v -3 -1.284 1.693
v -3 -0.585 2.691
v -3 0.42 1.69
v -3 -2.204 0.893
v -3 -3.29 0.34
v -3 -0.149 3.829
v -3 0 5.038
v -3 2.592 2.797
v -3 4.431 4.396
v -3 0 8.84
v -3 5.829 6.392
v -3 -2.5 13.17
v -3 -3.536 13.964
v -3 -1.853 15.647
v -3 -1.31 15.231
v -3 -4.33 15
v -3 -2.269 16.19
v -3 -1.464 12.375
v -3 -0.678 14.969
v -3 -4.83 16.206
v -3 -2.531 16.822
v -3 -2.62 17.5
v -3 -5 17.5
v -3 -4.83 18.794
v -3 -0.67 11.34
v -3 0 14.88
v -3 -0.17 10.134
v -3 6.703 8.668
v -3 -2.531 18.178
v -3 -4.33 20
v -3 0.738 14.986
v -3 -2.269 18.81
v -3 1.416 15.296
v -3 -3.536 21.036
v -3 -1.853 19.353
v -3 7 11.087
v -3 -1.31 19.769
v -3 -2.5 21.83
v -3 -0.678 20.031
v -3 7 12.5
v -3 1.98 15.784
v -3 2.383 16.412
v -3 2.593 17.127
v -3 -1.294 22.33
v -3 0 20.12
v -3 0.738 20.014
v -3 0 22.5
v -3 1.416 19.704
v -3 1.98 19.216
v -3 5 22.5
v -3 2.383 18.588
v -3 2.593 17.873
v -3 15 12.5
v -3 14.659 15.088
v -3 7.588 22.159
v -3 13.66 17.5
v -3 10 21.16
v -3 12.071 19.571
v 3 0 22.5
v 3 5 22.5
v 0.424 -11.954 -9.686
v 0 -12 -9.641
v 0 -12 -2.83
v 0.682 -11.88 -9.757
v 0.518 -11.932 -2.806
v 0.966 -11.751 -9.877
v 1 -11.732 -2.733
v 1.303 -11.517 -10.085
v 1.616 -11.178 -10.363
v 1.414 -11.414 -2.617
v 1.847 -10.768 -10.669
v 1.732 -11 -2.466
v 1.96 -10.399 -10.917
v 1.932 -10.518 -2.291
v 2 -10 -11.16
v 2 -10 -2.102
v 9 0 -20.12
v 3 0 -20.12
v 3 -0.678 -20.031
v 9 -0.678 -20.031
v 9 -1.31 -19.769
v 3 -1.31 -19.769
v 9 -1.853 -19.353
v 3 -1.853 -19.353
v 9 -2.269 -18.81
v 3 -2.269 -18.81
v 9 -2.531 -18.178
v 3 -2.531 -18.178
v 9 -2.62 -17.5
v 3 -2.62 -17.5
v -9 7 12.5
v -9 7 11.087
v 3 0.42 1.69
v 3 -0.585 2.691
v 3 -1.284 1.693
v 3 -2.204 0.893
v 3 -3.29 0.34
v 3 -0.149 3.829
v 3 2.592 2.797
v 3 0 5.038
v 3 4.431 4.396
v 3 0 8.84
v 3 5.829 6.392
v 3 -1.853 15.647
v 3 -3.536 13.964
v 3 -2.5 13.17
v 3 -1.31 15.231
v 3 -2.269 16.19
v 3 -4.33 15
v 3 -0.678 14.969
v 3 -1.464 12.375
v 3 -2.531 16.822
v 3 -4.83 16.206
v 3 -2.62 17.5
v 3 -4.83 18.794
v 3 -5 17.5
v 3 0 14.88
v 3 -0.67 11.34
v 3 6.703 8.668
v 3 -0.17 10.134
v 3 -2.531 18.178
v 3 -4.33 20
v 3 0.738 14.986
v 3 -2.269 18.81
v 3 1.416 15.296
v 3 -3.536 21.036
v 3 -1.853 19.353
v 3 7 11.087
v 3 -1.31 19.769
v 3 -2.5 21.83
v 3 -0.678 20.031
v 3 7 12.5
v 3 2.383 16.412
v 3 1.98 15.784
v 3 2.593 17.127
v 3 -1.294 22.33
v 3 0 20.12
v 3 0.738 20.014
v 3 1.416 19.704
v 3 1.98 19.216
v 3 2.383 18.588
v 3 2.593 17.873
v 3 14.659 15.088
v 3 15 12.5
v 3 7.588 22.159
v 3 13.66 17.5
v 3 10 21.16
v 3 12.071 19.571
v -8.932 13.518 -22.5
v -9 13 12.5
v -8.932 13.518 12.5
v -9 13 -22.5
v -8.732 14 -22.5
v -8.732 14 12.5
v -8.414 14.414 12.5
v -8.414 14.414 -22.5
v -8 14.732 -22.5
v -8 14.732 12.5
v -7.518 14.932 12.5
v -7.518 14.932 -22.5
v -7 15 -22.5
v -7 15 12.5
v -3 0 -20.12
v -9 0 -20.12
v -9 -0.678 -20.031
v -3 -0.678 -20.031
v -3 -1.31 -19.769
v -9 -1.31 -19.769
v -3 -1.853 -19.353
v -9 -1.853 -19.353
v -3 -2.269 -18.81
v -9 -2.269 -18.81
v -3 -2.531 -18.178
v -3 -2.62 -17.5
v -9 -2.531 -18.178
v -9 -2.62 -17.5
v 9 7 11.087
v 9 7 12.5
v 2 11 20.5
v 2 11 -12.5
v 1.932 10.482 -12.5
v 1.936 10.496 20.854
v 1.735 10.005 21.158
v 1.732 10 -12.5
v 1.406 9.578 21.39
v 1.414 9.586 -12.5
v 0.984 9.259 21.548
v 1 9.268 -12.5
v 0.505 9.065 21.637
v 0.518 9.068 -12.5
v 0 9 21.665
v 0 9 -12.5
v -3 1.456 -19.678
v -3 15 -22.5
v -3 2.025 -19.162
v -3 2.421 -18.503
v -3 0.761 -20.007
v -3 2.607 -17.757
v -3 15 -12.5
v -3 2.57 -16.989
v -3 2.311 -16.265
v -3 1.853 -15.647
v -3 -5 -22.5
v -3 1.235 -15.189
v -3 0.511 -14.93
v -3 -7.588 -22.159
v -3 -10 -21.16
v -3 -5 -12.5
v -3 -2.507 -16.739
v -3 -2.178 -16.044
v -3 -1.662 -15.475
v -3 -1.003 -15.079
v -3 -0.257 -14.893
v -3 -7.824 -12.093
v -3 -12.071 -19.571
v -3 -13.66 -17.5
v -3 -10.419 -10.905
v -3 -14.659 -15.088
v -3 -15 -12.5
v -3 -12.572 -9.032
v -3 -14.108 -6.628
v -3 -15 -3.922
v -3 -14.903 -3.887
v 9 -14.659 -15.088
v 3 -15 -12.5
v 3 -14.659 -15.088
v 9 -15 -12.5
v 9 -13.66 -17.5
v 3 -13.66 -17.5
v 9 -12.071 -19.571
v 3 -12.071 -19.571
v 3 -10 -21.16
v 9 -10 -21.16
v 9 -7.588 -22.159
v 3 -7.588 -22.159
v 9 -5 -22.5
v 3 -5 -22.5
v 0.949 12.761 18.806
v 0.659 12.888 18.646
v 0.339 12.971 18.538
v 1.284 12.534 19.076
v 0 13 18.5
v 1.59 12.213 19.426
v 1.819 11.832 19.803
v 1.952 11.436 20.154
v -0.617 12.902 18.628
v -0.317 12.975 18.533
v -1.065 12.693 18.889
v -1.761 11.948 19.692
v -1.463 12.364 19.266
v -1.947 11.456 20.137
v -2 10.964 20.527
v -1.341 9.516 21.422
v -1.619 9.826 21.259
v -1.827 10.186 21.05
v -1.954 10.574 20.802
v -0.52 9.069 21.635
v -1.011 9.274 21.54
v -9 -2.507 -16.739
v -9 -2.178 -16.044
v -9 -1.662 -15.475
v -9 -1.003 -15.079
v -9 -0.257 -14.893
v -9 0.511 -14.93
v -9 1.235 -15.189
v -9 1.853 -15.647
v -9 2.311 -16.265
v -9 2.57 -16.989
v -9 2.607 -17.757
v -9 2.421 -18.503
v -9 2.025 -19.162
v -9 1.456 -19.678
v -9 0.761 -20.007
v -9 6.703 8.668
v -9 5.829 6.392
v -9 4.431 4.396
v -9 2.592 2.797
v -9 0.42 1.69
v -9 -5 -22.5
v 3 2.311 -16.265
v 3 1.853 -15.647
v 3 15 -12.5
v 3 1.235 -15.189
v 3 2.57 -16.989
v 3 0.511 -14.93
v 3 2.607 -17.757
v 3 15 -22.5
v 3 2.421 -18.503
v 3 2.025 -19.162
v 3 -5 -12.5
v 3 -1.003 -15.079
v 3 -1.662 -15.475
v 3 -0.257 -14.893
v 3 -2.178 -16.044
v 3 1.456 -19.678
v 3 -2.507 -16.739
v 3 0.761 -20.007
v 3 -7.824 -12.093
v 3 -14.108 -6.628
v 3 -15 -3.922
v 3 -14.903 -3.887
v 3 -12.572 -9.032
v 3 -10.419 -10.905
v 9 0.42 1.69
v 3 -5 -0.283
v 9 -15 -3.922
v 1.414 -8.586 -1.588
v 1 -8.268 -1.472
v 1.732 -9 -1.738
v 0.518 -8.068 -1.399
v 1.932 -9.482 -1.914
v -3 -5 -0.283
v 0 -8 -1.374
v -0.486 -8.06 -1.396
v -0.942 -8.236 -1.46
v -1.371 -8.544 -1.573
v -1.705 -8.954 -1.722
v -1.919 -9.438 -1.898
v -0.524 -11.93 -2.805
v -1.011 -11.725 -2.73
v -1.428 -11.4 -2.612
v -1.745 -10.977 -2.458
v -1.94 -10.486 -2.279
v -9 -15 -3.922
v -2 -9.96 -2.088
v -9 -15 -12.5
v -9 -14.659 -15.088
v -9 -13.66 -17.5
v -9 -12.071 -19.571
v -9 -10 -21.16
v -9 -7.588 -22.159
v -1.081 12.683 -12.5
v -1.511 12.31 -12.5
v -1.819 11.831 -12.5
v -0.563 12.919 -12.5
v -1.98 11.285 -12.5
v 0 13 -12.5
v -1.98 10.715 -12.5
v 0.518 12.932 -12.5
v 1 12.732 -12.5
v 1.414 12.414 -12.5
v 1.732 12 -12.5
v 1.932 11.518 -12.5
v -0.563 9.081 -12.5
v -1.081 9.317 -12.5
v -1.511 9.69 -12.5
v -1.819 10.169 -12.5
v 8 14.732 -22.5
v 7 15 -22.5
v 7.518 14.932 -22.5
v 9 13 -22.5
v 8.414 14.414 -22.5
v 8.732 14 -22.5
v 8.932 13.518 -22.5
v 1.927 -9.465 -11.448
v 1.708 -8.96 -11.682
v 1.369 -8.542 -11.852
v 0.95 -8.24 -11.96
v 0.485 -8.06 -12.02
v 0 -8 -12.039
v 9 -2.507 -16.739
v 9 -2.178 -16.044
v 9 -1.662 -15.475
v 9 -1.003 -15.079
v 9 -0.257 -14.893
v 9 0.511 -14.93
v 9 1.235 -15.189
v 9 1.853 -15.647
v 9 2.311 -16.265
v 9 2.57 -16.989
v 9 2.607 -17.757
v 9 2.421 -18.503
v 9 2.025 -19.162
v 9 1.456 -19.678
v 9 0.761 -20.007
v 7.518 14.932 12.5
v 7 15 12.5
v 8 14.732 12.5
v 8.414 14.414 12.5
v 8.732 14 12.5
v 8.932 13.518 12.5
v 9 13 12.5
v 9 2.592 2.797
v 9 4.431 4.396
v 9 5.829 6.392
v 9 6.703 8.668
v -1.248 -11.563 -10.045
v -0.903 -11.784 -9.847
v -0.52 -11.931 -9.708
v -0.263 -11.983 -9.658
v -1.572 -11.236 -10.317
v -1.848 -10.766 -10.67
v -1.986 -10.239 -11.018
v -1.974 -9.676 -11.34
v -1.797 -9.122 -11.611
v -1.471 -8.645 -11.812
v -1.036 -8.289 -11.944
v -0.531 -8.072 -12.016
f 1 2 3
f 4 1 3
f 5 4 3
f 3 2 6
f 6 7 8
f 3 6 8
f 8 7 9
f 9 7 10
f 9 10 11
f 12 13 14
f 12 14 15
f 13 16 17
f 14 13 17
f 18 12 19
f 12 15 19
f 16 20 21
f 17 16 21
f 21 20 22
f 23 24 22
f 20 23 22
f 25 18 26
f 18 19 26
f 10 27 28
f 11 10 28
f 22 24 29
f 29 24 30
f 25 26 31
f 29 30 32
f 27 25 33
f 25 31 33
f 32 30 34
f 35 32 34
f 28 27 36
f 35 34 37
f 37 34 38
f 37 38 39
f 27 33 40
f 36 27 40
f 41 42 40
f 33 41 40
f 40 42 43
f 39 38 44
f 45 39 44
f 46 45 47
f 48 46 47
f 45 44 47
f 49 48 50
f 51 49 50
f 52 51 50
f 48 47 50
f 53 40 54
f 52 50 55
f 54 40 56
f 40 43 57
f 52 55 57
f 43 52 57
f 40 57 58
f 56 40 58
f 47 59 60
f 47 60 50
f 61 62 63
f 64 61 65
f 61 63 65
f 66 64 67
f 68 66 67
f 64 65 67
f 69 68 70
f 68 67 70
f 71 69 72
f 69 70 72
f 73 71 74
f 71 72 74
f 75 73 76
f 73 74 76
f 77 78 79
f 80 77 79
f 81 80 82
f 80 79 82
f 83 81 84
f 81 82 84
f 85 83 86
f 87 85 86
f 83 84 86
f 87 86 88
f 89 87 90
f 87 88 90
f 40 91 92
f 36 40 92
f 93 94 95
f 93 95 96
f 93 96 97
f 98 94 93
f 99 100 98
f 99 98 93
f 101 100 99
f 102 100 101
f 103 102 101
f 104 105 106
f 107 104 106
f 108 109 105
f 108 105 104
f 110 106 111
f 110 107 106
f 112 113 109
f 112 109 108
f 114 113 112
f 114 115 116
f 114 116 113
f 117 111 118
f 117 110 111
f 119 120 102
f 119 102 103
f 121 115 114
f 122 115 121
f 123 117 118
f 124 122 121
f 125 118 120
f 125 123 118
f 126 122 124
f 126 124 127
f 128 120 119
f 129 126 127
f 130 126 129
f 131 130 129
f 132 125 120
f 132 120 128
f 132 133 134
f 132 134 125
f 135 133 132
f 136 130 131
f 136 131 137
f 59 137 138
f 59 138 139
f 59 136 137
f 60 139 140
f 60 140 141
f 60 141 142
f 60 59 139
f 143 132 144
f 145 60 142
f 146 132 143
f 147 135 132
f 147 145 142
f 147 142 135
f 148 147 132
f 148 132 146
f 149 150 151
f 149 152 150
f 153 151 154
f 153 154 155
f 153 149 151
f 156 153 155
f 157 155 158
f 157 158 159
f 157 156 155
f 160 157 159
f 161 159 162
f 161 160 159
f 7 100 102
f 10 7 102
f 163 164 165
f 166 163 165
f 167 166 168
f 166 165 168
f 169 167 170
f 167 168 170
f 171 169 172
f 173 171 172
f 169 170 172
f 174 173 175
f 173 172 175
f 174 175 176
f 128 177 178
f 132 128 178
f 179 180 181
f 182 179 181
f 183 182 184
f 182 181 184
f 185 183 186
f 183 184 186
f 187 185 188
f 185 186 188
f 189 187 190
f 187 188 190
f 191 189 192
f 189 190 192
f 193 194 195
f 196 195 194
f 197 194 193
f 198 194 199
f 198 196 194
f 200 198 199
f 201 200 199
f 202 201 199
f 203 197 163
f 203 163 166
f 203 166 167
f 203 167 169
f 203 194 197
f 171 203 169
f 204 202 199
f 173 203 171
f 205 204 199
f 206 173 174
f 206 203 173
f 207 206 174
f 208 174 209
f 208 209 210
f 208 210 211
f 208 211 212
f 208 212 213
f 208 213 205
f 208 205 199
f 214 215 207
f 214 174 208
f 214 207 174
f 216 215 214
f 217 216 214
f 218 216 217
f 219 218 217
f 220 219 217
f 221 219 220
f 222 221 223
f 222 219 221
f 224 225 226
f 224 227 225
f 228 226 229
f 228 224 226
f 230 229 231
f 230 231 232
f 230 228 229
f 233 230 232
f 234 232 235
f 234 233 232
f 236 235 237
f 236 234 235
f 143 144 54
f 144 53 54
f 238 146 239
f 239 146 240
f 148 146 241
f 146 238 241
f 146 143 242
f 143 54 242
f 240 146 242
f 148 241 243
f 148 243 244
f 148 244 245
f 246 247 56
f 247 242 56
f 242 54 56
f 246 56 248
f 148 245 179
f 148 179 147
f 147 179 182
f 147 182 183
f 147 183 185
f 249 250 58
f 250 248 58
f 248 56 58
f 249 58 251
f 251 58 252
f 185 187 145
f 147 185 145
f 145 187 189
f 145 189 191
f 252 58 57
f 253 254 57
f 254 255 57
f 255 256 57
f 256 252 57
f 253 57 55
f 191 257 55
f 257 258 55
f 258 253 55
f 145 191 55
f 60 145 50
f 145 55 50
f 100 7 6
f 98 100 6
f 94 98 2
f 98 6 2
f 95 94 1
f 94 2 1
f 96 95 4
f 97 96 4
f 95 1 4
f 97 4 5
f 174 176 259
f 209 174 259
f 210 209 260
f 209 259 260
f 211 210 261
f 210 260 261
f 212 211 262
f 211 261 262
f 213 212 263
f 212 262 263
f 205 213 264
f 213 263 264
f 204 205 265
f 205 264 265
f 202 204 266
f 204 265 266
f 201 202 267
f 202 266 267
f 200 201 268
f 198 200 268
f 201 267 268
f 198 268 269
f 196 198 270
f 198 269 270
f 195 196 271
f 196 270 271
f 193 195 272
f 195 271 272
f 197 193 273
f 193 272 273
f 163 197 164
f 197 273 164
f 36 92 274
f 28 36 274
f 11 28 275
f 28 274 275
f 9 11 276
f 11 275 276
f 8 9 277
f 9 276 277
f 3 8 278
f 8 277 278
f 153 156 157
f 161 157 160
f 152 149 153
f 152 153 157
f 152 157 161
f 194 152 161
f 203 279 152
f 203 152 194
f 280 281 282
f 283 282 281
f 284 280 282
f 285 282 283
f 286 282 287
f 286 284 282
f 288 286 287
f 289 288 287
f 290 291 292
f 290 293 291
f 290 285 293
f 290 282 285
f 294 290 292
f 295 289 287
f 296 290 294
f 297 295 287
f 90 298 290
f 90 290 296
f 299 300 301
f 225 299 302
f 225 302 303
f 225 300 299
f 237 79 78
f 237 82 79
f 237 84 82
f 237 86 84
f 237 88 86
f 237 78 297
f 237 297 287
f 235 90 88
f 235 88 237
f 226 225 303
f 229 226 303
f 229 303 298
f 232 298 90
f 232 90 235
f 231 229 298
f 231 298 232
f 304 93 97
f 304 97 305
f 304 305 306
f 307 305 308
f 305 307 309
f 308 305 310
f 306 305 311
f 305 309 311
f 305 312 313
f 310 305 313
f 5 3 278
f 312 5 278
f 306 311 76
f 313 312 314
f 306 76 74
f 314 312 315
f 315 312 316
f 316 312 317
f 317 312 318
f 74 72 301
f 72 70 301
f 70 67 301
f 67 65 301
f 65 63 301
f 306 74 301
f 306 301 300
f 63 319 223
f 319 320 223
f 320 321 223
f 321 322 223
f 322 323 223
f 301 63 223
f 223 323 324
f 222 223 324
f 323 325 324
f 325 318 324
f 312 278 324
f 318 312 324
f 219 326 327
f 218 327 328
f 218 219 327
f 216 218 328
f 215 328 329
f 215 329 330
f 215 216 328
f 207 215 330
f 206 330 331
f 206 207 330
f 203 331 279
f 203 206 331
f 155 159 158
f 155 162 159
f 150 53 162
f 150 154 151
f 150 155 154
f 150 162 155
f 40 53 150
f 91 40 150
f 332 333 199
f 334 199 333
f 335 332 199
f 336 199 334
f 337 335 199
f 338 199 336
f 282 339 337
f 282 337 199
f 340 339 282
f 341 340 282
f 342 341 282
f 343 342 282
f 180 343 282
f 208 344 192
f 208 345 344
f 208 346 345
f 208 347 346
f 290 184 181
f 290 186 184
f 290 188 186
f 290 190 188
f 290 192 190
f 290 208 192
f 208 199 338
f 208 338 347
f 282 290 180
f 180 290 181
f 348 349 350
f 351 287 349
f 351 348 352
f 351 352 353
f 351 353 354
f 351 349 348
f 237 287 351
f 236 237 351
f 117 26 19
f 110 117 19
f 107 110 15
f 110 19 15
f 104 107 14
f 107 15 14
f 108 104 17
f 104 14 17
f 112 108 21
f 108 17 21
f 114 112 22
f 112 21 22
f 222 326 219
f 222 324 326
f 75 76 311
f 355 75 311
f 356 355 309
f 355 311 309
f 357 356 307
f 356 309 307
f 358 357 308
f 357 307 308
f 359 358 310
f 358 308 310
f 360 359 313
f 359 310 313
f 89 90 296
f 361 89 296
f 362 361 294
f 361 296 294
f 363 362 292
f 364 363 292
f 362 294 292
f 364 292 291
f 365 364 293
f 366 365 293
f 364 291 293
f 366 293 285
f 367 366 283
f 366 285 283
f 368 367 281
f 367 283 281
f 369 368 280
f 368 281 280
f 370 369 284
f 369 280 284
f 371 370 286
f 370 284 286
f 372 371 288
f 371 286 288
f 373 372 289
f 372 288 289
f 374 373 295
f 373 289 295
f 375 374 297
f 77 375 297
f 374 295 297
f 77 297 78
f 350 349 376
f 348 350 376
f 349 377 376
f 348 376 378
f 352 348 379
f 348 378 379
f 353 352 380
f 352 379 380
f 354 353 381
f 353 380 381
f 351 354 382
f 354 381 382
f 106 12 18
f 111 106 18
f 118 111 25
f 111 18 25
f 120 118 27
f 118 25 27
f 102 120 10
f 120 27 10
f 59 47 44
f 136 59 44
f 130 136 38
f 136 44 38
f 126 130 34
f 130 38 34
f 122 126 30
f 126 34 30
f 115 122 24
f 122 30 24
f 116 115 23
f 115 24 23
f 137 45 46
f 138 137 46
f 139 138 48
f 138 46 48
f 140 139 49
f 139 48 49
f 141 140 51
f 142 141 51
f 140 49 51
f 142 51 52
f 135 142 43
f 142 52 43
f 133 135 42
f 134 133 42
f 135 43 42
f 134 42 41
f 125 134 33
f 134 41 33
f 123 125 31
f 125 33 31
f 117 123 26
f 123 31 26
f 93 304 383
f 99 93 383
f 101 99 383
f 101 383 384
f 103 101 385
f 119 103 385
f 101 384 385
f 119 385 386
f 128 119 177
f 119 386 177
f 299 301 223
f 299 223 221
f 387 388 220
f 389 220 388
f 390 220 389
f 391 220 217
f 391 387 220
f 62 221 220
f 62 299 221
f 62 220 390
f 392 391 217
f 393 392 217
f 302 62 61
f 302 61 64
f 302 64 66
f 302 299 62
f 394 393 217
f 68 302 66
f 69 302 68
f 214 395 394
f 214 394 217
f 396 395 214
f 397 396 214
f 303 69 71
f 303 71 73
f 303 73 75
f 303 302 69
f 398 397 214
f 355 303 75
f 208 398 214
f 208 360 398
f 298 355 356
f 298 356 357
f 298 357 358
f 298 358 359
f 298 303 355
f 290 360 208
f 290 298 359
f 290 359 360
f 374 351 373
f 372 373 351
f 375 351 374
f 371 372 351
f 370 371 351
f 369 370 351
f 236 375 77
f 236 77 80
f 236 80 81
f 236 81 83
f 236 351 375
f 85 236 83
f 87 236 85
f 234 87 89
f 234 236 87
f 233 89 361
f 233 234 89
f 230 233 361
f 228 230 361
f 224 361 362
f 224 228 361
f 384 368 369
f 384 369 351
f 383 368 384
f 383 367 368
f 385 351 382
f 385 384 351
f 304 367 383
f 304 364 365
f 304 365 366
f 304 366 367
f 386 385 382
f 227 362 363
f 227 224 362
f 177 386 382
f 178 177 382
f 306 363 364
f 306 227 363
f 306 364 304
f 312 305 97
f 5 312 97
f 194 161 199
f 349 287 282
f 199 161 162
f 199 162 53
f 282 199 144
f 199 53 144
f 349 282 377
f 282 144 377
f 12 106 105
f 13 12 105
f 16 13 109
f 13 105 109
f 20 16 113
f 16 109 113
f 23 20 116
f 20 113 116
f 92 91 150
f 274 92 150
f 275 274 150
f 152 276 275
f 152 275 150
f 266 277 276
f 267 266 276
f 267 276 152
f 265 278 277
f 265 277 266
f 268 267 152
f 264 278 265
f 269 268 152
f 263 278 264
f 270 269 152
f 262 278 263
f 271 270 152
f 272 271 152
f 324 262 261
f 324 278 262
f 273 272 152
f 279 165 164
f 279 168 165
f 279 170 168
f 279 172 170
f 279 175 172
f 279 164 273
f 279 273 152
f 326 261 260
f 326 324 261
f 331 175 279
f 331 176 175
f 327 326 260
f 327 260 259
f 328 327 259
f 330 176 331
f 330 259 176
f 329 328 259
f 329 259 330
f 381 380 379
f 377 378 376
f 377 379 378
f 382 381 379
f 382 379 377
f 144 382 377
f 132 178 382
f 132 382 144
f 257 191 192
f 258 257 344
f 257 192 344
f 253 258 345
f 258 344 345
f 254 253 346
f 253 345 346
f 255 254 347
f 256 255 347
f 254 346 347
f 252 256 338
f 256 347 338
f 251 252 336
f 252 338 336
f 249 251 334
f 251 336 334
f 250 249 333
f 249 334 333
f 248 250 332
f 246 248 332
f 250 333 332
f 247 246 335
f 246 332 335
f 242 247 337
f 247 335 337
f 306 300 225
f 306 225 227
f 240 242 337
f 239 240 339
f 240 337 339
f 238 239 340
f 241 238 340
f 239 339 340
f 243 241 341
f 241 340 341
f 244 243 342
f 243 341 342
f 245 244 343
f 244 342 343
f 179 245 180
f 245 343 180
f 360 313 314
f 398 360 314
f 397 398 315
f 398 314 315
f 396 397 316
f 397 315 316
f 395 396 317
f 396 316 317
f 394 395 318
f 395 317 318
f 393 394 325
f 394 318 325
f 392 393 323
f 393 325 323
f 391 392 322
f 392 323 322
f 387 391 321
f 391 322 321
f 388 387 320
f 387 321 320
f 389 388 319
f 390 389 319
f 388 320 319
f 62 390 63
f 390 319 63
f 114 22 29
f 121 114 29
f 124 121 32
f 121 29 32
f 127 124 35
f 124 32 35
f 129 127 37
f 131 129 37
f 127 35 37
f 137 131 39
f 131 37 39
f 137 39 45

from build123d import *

# Parameters (mm, degrees)
F1_DEPTH     = 15
F3_DEPTH     = 6
F5_DEPTH     = 18
F6_R         = 10
F7_R         = 10
F10_DEPTH    = 6
F11_DEPTH    = 6
F12_R        = 2
F14_DEPTH    = 6
F18_DEPTH    = 40
F20_DEPTH    = 40
F22_DEPTH    = 6
F23_T1_DEPTH = 6


# Not quite as in the source:
# - a fillet or chamfer that OpenCascade refuses, or shapes differently, is made with other operations: its cross-section is extruded or revolved along the edge and cut away or added


with BuildPart() as f1:
    # F0 (on Front) → F1 (new body, symmetric)
    with BuildSketch(Plane.XZ):
        Polygon((9, -12.5), (9, 12.5), (3, 12.5), (3, 22.5), (-3, 22.5), (-3, 12.5), (-9, 12.5), (-9, -12.5), (-9, -22.5), (-3, -22.5), (-3, -12.5), (3, -12.5), (3, -22.5), (9, -22.5), align=None)
    extrude(amount=F1_DEPTH, both=True)

    # F2 (on face) → F3 (cut)
    with BuildSketch(Plane(origin=(-3, 0, 0), x_dir=(0, -1, 0), z_dir=(-1, 0, 0))):
        with BuildLine():
            ThreePointArc((0, 20.12), (-2.62, 17.5), (0, 14.88))
            Line((0, 14.88), (0, 20.12))
        make_face()
        with BuildLine():
            Line((0, 20.12), (0, 14.88))
            ThreePointArc((0, 14.88), (1.8526197667, 15.6473802333), (2.62, 17.5))
            ThreePointArc((2.62, 17.5), (1.8526197667, 19.3526197667), (0, 20.12))
        make_face()
    extrude(amount=-F3_DEPTH, mode=Mode.SUBTRACT)

    # F4 (on face) → F5 (cut)
    with BuildSketch(Plane(origin=(-9, 0, 0), x_dir=(0, -1, 0), z_dir=(-1, 0, 0))):
        with BuildLine():
            ThreePointArc((0, -20.12), (1.8526197667, -19.3526197667), (2.62, -17.5))
            ThreePointArc((2.62, -17.5), (-1.8526197667, -15.6473802333), (0, -20.12))
        make_face()
    extrude(amount=-F5_DEPTH, mode=Mode.SUBTRACT)

    # F6
    f6_edges = [f1.edges().sort_by_distance(p)[0] for p in [
        (0, -15, -12.5),
    ]]
    fillet(f6_edges, radius=F6_R)

    # F7
    f7_edges = [f1.edges().sort_by_distance(p)[0] for p in [
        (0, 15, 22.5),
        (0, -15, 22.5),
        (6, -15, -22.5),
        (-6, -15, -22.5),
    ]]
    fillet(f7_edges, radius=F7_R)

    # F9 (on face) → F10 (cut)
    with BuildSketch(Plane(origin=(-9, 0, 0), x_dir=(0, -1, 0), z_dir=(-1, 0, 0))):
        with BuildLine():
            ThreePointArc((-7, 11.0872004348), (-5.1915204429, 5.3514360713), (-0.4202014333, 1.690274227))
            Line((-0.4202014333, 1.690274227), (15, -3.9222201011))
            Line((15, -3.9222201011), (15, 12.5))
            Line((15, 12.5), (-7, 12.5))
            Line((-7, 12.5), (-7, 11.0872004348))
        make_face()
    extrude(amount=-F10_DEPTH, mode=Mode.SUBTRACT)

    # F8 (on face) → F11 (cut)
    with BuildSketch(Plane.YZ.offset(9)):
        with BuildLine():
            Line((7, 12.5), (-15, 12.5))
            Line((-15, 12.5), (-15, -3.92222))
            Line((-15, -3.92222), (0.4202014333, 1.6902743281))
            ThreePointArc((0.4202014333, 1.6902743281), (5.1915204429, 5.3514361724), (7, 11.087200536))
            Line((7, 11.087200536), (7, 12.5))
        make_face()
    extrude(amount=-F11_DEPTH, mode=Mode.SUBTRACT)

    # F12
    f12_edges = [f1.edges().sort_by_distance(p)[0] for p in [
        (9, 15, -5),
        (-9, 15, -5),
    ]]
    fillet(f12_edges, radius=F12_R)

    # F13 (on face) → F14 (cut)
    with BuildSketch(Plane(origin=(-3, 0, 0), x_dir=(0, -1, 0), z_dir=(-1, 0, 0))):
        with BuildLine():
            Line((5, 22.5), (0, 22.5))
            ThreePointArc((0, 22.5), (3.5355339059, 21.0355339059), (5, 17.5))
            Line((5, 17.5), (5, -0.2825177585))
            Line((5, -0.2825177585), (14.9033390576, -3.8870383953))
            ThreePointArc((14.9033390576, -3.8870383953), (14.9758054957, -3.1952012025), (15, -2.5))
            Line((15, -2.5), (15, 12.5))
            ThreePointArc((15, 12.5), (12.0710678119, 19.5710678119), (5, 22.5))
        make_face()
    extrude(amount=-F14_DEPTH, mode=Mode.SUBTRACT)

    # F17 (on face) → F18 (cut)
    with BuildSketch(Plane.XY.offset(17.5)):
        with BuildLine():
            ThreePointArc((2, -10), (1.4142135624, -8.5857864376), (0, -8))
            Line((0, -8), (0, -12))
            ThreePointArc((0, -12), (1.4142135624, -11.4142135624), (2, -10))
        make_face()
        with BuildLine():
            Line((0, -12), (0, -8))
            ThreePointArc((0, -8), (-2, -10), (0, -12))
        make_face()
    extrude(amount=-F18_DEPTH, mode=Mode.SUBTRACT)

    # F19 (on face) → F20 (cut)
    with BuildSketch(Plane(origin=(0, 0, -12.5), x_dir=(1, 0, 0), z_dir=(0, 0, -1))):
        with BuildLine():
            Line((0, -9), (0, -11))
            Line((0, -11), (0, -13))
            ThreePointArc((0, -13), (1.4142135624, -12.4142135624), (2, -11))
            ThreePointArc((2, -11), (1.4142135624, -9.5857864376), (0, -9))
        make_face()
        with BuildLine():
            Line((0, -13), (0, -11))
            Line((0, -11), (0, -9))
            ThreePointArc((0, -9), (-2, -11), (0, -13))
        make_face()
    extrude(amount=-F20_DEPTH, mode=Mode.SUBTRACT)

    # F21 (on face) → F22 (cut)
    with BuildSketch(Plane.YZ.offset(3)):
        with BuildLine():
            ThreePointArc((0, 12.5), (-3.5355339059, 13.9644660941), (-5, 17.5))
            Line((-5, 17.5), (-5, -0.2825177585))
            Line((-5.0000000325, -0.2825176692), (0, 1.537333514))
            Line((0, 1.537333514), (0, 12.5))
        make_face()
    extrude(amount=-F22_DEPTH, mode=Mode.SUBTRACT)

    # F23: fillet of radius 5 on 2 edges, made by hand

    # F23_s2 → F23_t1 (join)
    with BuildSketch(Plane.YZ.offset(-3)):
        with BuildLine():
            ThreePointArc((-2.5, 13.1698729811), (-0.6698729811, 11.3397459622), (0, 8.8397459622))
            Line((0, 8.8397459622), (0, 12.5))
            ThreePointArc((0, 12.5), (-1.2940952255, 12.6703708686), (-2.5, 13.1698729811))
        make_face()
        with BuildLine():
            ThreePointArc((0, 5.0383711039), (-0.9042397786, 2.1704889222), (-3.2898992834, 0.339908))
            Line((-3.2898992834, 0.339908), (0, 1.537333514))
            Line((0, 1.537333514), (0, 5.0383711039))
        make_face()
    extrude(amount=F23_T1_DEPTH)


solid = f1.part
